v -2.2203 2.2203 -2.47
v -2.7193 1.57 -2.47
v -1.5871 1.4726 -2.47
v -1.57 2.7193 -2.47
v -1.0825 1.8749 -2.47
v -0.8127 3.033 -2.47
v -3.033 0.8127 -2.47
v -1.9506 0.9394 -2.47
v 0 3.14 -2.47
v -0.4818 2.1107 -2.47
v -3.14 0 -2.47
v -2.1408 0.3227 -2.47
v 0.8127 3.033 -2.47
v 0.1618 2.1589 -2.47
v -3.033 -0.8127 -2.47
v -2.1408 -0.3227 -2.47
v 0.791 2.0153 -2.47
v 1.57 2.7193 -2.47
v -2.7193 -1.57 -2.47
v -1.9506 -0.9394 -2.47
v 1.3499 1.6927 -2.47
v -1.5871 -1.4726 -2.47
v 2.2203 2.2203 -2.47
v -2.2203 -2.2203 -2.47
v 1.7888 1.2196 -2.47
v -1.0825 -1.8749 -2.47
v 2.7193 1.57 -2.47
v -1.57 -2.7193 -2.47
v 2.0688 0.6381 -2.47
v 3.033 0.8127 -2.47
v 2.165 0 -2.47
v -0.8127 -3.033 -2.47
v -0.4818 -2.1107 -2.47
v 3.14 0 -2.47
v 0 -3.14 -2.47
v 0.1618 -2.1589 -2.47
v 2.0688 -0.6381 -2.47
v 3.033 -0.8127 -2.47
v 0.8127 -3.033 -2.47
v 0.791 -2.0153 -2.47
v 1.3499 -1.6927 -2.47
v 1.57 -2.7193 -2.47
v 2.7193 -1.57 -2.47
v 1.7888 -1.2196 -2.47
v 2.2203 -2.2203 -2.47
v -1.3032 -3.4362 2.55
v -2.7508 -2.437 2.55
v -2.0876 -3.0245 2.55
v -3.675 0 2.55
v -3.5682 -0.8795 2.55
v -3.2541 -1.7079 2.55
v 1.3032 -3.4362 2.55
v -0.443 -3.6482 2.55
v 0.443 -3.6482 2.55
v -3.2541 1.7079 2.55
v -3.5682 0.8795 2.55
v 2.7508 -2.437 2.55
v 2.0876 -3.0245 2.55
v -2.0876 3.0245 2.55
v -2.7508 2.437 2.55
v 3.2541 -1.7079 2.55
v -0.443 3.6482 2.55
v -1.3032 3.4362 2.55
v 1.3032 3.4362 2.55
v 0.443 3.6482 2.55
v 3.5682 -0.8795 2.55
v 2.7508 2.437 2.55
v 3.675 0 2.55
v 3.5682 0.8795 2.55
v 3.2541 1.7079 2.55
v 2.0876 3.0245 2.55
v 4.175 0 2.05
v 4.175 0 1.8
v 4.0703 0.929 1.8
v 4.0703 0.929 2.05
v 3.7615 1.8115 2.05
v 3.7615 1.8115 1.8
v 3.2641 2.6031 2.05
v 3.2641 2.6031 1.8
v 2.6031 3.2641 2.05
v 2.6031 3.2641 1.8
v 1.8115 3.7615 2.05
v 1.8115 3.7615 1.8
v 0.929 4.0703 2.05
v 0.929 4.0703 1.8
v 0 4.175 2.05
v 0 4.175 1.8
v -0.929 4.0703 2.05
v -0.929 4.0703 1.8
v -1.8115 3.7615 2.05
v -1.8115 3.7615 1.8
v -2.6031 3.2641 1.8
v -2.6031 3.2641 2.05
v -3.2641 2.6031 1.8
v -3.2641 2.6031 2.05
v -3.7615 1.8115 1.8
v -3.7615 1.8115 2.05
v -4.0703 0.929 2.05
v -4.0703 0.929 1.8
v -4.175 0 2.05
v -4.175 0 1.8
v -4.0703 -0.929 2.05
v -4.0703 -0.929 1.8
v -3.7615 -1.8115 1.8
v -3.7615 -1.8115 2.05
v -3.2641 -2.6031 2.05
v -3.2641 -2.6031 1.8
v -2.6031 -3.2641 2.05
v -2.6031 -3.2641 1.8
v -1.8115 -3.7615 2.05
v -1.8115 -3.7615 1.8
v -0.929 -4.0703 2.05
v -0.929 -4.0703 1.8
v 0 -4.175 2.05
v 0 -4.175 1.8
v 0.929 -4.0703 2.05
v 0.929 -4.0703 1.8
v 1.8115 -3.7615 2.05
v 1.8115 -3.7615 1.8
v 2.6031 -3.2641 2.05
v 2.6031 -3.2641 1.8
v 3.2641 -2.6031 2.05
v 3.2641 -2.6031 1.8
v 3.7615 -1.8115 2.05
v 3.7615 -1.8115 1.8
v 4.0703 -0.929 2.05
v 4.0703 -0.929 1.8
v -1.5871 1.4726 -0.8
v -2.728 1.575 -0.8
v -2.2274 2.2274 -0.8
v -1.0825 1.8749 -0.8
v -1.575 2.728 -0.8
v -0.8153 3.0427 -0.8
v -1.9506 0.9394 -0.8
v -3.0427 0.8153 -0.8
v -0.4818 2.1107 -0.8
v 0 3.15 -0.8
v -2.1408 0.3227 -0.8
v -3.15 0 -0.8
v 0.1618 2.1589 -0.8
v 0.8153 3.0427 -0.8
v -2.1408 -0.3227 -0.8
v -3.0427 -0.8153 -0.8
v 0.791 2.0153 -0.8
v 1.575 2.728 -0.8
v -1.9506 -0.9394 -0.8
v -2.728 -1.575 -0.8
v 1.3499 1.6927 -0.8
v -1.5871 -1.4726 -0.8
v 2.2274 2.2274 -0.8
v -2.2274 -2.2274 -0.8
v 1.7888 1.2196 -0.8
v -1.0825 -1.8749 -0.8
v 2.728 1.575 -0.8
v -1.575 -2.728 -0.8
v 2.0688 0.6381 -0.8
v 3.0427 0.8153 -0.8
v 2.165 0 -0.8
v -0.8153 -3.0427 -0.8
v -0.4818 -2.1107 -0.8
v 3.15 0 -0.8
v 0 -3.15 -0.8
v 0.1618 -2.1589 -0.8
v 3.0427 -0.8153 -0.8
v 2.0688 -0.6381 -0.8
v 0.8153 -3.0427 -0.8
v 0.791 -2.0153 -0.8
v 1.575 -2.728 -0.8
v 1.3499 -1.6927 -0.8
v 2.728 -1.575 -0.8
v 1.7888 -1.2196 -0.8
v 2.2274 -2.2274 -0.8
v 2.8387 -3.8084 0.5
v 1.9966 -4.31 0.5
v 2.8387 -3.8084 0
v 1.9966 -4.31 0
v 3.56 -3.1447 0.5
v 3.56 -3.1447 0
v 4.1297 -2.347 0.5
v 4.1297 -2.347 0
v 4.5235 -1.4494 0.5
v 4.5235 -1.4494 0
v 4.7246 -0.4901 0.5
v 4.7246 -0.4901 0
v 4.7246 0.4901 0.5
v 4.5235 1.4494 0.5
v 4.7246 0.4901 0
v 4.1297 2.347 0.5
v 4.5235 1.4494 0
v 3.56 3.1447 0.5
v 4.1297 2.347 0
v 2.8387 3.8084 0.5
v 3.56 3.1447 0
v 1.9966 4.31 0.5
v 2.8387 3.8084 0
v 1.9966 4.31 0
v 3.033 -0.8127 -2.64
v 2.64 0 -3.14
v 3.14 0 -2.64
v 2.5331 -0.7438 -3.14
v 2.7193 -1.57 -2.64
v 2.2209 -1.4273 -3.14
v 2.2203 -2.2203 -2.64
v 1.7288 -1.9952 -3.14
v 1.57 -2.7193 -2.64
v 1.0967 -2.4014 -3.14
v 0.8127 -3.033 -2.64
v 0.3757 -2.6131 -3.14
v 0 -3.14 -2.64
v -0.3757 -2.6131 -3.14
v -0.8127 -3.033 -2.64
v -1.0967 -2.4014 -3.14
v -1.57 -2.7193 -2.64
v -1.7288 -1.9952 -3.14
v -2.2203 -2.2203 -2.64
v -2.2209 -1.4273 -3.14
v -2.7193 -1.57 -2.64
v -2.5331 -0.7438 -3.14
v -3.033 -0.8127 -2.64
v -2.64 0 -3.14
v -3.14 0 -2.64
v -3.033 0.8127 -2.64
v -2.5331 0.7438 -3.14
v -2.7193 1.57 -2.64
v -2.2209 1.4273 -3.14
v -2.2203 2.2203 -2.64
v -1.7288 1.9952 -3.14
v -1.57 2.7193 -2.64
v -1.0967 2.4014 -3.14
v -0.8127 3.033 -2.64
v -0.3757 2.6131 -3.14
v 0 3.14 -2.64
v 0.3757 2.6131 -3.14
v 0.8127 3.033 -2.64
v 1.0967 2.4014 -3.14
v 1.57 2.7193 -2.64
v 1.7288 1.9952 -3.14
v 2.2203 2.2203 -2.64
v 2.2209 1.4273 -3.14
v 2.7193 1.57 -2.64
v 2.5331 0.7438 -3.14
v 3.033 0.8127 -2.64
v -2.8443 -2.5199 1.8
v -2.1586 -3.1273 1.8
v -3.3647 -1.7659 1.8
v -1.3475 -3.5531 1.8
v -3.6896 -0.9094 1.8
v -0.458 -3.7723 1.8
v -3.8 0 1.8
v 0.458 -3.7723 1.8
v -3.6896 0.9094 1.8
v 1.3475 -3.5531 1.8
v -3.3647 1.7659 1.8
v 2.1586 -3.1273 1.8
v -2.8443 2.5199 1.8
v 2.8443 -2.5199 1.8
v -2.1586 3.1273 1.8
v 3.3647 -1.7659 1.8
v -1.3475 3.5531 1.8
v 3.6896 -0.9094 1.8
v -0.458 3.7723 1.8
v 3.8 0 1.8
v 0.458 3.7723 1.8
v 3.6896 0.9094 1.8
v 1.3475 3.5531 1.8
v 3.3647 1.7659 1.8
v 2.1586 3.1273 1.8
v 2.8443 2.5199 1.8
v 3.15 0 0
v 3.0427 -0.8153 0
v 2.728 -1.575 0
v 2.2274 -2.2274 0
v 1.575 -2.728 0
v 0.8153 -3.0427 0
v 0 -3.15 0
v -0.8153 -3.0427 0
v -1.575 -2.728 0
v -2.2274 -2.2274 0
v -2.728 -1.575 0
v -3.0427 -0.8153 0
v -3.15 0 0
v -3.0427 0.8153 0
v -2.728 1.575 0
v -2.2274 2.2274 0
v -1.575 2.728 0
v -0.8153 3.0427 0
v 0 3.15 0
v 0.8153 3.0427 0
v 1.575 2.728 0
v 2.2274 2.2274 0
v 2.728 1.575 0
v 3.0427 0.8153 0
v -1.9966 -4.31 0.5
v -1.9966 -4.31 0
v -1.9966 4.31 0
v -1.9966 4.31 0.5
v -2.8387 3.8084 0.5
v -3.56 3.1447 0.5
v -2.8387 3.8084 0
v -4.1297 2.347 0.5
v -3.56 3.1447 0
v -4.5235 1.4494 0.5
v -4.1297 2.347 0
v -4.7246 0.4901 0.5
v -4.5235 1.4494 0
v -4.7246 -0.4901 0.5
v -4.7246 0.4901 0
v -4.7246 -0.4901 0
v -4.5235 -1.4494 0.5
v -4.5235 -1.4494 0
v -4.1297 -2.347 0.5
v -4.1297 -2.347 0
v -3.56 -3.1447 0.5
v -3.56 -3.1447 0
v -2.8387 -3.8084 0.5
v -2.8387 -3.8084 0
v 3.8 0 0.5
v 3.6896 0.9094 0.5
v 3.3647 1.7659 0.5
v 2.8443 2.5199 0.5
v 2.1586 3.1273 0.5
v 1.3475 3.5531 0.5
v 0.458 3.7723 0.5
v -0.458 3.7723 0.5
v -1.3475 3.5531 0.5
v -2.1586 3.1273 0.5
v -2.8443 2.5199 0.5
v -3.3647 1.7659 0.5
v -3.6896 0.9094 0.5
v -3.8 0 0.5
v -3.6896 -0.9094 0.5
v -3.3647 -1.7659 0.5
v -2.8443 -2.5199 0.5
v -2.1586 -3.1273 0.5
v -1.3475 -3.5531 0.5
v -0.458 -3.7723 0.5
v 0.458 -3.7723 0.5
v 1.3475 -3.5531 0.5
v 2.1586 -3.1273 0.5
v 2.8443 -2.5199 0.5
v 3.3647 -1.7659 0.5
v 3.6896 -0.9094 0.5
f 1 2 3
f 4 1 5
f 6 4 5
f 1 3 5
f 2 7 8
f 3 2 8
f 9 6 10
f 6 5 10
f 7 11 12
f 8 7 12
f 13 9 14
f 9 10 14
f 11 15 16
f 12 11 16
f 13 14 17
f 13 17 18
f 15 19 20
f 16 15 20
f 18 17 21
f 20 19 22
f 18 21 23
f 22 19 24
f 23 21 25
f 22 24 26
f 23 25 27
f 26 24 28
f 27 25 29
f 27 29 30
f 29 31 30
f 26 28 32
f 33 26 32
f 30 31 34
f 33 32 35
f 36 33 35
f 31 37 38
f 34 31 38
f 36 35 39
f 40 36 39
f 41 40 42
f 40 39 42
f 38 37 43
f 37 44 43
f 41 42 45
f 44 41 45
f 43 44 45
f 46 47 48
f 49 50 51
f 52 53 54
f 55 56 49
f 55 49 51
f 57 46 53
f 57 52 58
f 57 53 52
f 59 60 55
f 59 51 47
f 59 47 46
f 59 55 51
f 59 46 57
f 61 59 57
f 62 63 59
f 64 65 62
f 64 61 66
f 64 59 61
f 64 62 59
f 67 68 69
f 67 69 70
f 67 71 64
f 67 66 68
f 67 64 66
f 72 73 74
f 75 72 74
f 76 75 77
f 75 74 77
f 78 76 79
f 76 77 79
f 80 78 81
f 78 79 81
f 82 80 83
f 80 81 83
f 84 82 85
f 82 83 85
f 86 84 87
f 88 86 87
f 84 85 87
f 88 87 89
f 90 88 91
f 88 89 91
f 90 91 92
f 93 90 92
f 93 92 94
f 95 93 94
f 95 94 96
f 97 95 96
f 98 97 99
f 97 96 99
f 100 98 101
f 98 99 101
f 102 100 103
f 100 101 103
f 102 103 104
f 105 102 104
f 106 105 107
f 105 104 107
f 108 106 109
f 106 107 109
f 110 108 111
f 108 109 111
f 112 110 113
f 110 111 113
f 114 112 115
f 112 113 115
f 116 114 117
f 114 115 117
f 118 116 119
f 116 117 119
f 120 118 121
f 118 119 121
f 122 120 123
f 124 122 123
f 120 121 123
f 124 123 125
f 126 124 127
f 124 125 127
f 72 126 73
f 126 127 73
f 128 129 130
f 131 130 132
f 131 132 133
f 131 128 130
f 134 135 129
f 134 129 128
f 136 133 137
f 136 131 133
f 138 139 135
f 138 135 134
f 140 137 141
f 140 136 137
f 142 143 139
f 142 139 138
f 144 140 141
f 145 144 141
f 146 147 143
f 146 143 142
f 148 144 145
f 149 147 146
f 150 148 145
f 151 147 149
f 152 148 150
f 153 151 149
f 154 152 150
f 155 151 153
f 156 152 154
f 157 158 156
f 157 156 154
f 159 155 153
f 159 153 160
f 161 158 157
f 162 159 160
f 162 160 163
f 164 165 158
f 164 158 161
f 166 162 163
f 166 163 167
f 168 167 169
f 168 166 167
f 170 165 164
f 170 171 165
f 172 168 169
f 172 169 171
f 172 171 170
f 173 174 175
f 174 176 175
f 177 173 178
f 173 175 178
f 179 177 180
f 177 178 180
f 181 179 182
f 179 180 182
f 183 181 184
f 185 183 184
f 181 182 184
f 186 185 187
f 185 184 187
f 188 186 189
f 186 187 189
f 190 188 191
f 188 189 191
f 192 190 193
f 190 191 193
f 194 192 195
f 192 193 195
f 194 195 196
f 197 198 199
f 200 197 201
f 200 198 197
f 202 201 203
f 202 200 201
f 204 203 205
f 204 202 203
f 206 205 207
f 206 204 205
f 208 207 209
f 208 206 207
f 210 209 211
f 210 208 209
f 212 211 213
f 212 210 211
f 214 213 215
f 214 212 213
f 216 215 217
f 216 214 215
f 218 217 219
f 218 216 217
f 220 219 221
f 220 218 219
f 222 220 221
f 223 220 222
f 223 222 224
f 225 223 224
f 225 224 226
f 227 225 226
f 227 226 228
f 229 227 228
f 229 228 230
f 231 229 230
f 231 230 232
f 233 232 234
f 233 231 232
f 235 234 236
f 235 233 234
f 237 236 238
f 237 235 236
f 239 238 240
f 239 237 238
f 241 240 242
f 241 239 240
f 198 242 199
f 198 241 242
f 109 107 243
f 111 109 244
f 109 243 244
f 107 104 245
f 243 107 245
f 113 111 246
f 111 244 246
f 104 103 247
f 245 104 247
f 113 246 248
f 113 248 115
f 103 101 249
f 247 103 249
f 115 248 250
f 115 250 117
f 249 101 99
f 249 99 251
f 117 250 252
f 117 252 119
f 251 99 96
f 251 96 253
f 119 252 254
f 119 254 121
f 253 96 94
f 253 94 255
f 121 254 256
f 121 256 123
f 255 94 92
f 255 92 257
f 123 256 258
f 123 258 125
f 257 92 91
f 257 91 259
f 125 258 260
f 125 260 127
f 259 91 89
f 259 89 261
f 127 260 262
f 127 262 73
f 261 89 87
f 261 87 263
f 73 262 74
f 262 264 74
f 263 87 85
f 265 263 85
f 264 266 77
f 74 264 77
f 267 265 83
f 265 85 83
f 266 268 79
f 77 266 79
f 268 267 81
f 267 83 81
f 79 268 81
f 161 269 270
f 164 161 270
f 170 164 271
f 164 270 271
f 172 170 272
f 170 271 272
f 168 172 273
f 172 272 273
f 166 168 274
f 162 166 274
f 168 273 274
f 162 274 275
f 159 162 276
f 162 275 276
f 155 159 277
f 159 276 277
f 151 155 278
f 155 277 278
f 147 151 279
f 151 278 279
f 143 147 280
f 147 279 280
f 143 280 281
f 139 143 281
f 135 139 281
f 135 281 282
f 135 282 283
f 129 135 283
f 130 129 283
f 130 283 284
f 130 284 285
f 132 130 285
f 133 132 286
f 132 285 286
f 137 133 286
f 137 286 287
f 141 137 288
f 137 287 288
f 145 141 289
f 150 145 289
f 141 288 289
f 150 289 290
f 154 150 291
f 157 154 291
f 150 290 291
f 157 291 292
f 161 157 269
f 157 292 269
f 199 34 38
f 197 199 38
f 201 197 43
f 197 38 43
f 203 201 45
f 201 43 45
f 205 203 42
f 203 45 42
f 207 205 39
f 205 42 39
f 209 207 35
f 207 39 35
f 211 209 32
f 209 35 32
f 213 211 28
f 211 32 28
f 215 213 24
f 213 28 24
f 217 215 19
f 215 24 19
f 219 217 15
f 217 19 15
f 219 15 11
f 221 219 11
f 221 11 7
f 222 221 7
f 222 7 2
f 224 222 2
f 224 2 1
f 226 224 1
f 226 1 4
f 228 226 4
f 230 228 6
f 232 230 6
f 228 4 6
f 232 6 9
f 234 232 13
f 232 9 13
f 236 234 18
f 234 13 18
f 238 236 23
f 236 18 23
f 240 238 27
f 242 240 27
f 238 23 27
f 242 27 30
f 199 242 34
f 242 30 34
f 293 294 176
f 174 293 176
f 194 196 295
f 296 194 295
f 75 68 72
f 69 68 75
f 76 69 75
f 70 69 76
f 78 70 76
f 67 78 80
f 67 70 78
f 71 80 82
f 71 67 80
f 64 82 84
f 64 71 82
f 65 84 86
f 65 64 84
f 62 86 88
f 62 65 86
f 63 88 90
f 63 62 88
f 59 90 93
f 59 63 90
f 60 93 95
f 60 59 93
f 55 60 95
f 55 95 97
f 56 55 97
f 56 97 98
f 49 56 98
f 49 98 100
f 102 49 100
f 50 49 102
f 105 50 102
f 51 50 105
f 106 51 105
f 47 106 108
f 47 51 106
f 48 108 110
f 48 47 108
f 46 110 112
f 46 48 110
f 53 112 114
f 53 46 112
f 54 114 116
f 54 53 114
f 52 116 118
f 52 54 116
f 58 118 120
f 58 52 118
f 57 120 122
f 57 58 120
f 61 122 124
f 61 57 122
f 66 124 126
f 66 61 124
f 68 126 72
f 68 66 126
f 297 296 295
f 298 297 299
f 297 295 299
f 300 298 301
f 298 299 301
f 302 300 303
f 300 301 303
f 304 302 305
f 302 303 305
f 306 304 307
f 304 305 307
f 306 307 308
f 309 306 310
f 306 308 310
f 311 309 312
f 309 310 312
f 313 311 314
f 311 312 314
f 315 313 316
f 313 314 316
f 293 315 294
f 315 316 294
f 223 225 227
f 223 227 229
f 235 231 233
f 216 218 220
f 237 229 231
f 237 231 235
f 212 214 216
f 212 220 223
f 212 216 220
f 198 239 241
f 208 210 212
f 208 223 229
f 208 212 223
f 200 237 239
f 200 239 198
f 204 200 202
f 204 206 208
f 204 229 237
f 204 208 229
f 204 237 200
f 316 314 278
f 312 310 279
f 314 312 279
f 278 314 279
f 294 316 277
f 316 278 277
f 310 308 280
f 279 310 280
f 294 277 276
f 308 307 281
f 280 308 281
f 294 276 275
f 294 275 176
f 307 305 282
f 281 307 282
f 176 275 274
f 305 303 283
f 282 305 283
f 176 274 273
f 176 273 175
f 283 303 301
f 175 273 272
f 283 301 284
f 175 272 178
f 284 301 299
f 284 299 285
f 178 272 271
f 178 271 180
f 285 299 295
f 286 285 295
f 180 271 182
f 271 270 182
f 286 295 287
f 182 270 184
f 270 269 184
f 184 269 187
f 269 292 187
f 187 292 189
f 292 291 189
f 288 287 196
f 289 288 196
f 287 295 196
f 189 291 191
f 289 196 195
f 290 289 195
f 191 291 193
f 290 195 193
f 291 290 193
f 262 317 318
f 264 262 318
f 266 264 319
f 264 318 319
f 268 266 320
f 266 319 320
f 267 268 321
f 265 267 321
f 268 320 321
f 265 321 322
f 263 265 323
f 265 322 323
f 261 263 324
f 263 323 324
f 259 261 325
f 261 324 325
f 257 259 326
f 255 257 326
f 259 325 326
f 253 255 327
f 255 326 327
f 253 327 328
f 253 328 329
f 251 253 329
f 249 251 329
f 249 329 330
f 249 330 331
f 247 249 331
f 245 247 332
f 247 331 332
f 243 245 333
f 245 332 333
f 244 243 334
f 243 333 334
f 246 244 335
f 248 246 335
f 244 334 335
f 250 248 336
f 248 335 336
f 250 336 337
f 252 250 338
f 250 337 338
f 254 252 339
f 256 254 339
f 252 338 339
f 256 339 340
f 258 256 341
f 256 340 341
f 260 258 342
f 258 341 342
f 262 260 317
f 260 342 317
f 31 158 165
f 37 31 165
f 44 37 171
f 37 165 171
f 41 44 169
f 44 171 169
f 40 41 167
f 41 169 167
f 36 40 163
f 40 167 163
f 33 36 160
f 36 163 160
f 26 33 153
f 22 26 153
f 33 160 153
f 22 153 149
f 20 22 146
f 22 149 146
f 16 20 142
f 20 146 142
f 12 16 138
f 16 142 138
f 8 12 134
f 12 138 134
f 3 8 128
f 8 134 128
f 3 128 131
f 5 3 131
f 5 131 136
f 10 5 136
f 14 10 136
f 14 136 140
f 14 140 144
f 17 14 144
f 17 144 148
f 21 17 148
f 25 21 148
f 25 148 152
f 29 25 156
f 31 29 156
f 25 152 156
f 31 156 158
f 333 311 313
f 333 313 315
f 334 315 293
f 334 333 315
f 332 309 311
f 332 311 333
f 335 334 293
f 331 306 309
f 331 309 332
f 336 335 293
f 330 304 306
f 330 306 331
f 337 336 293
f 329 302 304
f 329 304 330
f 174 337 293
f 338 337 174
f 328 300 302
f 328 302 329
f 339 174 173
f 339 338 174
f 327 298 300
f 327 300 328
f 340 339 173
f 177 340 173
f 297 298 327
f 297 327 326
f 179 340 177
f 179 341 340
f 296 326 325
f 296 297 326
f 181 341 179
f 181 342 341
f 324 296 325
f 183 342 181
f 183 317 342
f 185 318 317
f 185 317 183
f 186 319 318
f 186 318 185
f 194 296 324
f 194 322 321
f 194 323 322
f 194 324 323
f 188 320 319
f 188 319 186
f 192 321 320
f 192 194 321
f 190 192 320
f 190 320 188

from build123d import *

# Parameters (mm, degrees)
F0_R      = 4.75
F1_DEPTH  = 0.5
F2_R      = 3.8
F3_DEPTH  = 1.3
F4_R      = 4.175
F4_R_2    = 3.8
F5_DEPTH  = 0.75
F6_SIZE   = 0.5
F8_DEPTH  = 2.551
F9_R      = 3.15
F10_DEPTH = 0.8
F11_R     = 2.165
F12_DEPTH = 1.67
F13_R     = 3.14
F14_DEPTH = 0.67
F15_SIZE  = 0.5


with BuildPart() as f1:
    # F0 (on Top) → F1 (new body)
    with BuildSketch(Plane.XY):
        Circle(F0_R)
    extrude(amount=F1_DEPTH)

    # F2 (on face) → F3 (join)
    with BuildSketch(Plane.XY.offset(0.5)):
        Circle(F2_R)
    extrude(amount=F3_DEPTH)

    # F4 (on face) → F5 (join)
    with BuildSketch(Plane.XY.offset(1.8)):
        Circle(F4_R)
        Circle(F4_R_2, mode=Mode.SUBTRACT)
        Circle(F4_R_2)
    extrude(amount=F5_DEPTH)

    # F6
    f6_edges = [f1.edges().sort_by_distance(p)[0] for p in [
        (-4.175, 0, 2.55),
    ]]
    chamfer(f6_edges, length=F6_SIZE)

    # F7 (on face) → F8 (cut, through all)
    with BuildSketch(Plane(origin=(0, 0, 0), x_dir=(1, 0, 0), z_dir=(0, 0, -1))):
        with BuildLine():
            Line((-1.9965971051, 4.31), (0, 4.31))
            Line((0, 4.31), (1.9965971051, 4.31))
            ThreePointArc((1.9965971051, 4.31), (0, 4.75), (-1.9965971051, 4.31))
        make_face()
        with BuildLine():
            Line((0, -4.31), (-1.9965971051, -4.31))
            ThreePointArc((-1.9965971051, -4.31), (0, -4.75), (1.9965971051, -4.31))
            Line((1.9965971051, -4.31), (0, -4.31))
        make_face()
    extrude(amount=-F8_DEPTH, mode=Mode.SUBTRACT)

    # F9 (on face) → F10 (join)
    with BuildSketch(Plane(origin=(0, 0, 0), x_dir=(1, 0, 0), z_dir=(0, 0, -1))):
        Circle(F9_R)
    extrude(amount=F10_DEPTH)

    # F11 (on face) → F12 (join)
    with BuildSketch(Plane(origin=(0, 0, -0.8), x_dir=(1, 0, 0), z_dir=(0, 0, -1))):
        Circle(F11_R)
    extrude(amount=F12_DEPTH)

    # F13 (on face) → F14 (join)
    with BuildSketch(Plane(origin=(0, 0, -2.47), x_dir=(1, 0, 0), z_dir=(0, 0, -1))):
        Circle(F13_R)
    extrude(amount=F14_DEPTH)

    # F15
    f15_edges = [f1.edges().sort_by_distance(p)[0] for p in [
        (-3.14, 0, -3.14),
    ]]
    chamfer(f15_edges, length=F15_SIZE)


solid = f1.part
